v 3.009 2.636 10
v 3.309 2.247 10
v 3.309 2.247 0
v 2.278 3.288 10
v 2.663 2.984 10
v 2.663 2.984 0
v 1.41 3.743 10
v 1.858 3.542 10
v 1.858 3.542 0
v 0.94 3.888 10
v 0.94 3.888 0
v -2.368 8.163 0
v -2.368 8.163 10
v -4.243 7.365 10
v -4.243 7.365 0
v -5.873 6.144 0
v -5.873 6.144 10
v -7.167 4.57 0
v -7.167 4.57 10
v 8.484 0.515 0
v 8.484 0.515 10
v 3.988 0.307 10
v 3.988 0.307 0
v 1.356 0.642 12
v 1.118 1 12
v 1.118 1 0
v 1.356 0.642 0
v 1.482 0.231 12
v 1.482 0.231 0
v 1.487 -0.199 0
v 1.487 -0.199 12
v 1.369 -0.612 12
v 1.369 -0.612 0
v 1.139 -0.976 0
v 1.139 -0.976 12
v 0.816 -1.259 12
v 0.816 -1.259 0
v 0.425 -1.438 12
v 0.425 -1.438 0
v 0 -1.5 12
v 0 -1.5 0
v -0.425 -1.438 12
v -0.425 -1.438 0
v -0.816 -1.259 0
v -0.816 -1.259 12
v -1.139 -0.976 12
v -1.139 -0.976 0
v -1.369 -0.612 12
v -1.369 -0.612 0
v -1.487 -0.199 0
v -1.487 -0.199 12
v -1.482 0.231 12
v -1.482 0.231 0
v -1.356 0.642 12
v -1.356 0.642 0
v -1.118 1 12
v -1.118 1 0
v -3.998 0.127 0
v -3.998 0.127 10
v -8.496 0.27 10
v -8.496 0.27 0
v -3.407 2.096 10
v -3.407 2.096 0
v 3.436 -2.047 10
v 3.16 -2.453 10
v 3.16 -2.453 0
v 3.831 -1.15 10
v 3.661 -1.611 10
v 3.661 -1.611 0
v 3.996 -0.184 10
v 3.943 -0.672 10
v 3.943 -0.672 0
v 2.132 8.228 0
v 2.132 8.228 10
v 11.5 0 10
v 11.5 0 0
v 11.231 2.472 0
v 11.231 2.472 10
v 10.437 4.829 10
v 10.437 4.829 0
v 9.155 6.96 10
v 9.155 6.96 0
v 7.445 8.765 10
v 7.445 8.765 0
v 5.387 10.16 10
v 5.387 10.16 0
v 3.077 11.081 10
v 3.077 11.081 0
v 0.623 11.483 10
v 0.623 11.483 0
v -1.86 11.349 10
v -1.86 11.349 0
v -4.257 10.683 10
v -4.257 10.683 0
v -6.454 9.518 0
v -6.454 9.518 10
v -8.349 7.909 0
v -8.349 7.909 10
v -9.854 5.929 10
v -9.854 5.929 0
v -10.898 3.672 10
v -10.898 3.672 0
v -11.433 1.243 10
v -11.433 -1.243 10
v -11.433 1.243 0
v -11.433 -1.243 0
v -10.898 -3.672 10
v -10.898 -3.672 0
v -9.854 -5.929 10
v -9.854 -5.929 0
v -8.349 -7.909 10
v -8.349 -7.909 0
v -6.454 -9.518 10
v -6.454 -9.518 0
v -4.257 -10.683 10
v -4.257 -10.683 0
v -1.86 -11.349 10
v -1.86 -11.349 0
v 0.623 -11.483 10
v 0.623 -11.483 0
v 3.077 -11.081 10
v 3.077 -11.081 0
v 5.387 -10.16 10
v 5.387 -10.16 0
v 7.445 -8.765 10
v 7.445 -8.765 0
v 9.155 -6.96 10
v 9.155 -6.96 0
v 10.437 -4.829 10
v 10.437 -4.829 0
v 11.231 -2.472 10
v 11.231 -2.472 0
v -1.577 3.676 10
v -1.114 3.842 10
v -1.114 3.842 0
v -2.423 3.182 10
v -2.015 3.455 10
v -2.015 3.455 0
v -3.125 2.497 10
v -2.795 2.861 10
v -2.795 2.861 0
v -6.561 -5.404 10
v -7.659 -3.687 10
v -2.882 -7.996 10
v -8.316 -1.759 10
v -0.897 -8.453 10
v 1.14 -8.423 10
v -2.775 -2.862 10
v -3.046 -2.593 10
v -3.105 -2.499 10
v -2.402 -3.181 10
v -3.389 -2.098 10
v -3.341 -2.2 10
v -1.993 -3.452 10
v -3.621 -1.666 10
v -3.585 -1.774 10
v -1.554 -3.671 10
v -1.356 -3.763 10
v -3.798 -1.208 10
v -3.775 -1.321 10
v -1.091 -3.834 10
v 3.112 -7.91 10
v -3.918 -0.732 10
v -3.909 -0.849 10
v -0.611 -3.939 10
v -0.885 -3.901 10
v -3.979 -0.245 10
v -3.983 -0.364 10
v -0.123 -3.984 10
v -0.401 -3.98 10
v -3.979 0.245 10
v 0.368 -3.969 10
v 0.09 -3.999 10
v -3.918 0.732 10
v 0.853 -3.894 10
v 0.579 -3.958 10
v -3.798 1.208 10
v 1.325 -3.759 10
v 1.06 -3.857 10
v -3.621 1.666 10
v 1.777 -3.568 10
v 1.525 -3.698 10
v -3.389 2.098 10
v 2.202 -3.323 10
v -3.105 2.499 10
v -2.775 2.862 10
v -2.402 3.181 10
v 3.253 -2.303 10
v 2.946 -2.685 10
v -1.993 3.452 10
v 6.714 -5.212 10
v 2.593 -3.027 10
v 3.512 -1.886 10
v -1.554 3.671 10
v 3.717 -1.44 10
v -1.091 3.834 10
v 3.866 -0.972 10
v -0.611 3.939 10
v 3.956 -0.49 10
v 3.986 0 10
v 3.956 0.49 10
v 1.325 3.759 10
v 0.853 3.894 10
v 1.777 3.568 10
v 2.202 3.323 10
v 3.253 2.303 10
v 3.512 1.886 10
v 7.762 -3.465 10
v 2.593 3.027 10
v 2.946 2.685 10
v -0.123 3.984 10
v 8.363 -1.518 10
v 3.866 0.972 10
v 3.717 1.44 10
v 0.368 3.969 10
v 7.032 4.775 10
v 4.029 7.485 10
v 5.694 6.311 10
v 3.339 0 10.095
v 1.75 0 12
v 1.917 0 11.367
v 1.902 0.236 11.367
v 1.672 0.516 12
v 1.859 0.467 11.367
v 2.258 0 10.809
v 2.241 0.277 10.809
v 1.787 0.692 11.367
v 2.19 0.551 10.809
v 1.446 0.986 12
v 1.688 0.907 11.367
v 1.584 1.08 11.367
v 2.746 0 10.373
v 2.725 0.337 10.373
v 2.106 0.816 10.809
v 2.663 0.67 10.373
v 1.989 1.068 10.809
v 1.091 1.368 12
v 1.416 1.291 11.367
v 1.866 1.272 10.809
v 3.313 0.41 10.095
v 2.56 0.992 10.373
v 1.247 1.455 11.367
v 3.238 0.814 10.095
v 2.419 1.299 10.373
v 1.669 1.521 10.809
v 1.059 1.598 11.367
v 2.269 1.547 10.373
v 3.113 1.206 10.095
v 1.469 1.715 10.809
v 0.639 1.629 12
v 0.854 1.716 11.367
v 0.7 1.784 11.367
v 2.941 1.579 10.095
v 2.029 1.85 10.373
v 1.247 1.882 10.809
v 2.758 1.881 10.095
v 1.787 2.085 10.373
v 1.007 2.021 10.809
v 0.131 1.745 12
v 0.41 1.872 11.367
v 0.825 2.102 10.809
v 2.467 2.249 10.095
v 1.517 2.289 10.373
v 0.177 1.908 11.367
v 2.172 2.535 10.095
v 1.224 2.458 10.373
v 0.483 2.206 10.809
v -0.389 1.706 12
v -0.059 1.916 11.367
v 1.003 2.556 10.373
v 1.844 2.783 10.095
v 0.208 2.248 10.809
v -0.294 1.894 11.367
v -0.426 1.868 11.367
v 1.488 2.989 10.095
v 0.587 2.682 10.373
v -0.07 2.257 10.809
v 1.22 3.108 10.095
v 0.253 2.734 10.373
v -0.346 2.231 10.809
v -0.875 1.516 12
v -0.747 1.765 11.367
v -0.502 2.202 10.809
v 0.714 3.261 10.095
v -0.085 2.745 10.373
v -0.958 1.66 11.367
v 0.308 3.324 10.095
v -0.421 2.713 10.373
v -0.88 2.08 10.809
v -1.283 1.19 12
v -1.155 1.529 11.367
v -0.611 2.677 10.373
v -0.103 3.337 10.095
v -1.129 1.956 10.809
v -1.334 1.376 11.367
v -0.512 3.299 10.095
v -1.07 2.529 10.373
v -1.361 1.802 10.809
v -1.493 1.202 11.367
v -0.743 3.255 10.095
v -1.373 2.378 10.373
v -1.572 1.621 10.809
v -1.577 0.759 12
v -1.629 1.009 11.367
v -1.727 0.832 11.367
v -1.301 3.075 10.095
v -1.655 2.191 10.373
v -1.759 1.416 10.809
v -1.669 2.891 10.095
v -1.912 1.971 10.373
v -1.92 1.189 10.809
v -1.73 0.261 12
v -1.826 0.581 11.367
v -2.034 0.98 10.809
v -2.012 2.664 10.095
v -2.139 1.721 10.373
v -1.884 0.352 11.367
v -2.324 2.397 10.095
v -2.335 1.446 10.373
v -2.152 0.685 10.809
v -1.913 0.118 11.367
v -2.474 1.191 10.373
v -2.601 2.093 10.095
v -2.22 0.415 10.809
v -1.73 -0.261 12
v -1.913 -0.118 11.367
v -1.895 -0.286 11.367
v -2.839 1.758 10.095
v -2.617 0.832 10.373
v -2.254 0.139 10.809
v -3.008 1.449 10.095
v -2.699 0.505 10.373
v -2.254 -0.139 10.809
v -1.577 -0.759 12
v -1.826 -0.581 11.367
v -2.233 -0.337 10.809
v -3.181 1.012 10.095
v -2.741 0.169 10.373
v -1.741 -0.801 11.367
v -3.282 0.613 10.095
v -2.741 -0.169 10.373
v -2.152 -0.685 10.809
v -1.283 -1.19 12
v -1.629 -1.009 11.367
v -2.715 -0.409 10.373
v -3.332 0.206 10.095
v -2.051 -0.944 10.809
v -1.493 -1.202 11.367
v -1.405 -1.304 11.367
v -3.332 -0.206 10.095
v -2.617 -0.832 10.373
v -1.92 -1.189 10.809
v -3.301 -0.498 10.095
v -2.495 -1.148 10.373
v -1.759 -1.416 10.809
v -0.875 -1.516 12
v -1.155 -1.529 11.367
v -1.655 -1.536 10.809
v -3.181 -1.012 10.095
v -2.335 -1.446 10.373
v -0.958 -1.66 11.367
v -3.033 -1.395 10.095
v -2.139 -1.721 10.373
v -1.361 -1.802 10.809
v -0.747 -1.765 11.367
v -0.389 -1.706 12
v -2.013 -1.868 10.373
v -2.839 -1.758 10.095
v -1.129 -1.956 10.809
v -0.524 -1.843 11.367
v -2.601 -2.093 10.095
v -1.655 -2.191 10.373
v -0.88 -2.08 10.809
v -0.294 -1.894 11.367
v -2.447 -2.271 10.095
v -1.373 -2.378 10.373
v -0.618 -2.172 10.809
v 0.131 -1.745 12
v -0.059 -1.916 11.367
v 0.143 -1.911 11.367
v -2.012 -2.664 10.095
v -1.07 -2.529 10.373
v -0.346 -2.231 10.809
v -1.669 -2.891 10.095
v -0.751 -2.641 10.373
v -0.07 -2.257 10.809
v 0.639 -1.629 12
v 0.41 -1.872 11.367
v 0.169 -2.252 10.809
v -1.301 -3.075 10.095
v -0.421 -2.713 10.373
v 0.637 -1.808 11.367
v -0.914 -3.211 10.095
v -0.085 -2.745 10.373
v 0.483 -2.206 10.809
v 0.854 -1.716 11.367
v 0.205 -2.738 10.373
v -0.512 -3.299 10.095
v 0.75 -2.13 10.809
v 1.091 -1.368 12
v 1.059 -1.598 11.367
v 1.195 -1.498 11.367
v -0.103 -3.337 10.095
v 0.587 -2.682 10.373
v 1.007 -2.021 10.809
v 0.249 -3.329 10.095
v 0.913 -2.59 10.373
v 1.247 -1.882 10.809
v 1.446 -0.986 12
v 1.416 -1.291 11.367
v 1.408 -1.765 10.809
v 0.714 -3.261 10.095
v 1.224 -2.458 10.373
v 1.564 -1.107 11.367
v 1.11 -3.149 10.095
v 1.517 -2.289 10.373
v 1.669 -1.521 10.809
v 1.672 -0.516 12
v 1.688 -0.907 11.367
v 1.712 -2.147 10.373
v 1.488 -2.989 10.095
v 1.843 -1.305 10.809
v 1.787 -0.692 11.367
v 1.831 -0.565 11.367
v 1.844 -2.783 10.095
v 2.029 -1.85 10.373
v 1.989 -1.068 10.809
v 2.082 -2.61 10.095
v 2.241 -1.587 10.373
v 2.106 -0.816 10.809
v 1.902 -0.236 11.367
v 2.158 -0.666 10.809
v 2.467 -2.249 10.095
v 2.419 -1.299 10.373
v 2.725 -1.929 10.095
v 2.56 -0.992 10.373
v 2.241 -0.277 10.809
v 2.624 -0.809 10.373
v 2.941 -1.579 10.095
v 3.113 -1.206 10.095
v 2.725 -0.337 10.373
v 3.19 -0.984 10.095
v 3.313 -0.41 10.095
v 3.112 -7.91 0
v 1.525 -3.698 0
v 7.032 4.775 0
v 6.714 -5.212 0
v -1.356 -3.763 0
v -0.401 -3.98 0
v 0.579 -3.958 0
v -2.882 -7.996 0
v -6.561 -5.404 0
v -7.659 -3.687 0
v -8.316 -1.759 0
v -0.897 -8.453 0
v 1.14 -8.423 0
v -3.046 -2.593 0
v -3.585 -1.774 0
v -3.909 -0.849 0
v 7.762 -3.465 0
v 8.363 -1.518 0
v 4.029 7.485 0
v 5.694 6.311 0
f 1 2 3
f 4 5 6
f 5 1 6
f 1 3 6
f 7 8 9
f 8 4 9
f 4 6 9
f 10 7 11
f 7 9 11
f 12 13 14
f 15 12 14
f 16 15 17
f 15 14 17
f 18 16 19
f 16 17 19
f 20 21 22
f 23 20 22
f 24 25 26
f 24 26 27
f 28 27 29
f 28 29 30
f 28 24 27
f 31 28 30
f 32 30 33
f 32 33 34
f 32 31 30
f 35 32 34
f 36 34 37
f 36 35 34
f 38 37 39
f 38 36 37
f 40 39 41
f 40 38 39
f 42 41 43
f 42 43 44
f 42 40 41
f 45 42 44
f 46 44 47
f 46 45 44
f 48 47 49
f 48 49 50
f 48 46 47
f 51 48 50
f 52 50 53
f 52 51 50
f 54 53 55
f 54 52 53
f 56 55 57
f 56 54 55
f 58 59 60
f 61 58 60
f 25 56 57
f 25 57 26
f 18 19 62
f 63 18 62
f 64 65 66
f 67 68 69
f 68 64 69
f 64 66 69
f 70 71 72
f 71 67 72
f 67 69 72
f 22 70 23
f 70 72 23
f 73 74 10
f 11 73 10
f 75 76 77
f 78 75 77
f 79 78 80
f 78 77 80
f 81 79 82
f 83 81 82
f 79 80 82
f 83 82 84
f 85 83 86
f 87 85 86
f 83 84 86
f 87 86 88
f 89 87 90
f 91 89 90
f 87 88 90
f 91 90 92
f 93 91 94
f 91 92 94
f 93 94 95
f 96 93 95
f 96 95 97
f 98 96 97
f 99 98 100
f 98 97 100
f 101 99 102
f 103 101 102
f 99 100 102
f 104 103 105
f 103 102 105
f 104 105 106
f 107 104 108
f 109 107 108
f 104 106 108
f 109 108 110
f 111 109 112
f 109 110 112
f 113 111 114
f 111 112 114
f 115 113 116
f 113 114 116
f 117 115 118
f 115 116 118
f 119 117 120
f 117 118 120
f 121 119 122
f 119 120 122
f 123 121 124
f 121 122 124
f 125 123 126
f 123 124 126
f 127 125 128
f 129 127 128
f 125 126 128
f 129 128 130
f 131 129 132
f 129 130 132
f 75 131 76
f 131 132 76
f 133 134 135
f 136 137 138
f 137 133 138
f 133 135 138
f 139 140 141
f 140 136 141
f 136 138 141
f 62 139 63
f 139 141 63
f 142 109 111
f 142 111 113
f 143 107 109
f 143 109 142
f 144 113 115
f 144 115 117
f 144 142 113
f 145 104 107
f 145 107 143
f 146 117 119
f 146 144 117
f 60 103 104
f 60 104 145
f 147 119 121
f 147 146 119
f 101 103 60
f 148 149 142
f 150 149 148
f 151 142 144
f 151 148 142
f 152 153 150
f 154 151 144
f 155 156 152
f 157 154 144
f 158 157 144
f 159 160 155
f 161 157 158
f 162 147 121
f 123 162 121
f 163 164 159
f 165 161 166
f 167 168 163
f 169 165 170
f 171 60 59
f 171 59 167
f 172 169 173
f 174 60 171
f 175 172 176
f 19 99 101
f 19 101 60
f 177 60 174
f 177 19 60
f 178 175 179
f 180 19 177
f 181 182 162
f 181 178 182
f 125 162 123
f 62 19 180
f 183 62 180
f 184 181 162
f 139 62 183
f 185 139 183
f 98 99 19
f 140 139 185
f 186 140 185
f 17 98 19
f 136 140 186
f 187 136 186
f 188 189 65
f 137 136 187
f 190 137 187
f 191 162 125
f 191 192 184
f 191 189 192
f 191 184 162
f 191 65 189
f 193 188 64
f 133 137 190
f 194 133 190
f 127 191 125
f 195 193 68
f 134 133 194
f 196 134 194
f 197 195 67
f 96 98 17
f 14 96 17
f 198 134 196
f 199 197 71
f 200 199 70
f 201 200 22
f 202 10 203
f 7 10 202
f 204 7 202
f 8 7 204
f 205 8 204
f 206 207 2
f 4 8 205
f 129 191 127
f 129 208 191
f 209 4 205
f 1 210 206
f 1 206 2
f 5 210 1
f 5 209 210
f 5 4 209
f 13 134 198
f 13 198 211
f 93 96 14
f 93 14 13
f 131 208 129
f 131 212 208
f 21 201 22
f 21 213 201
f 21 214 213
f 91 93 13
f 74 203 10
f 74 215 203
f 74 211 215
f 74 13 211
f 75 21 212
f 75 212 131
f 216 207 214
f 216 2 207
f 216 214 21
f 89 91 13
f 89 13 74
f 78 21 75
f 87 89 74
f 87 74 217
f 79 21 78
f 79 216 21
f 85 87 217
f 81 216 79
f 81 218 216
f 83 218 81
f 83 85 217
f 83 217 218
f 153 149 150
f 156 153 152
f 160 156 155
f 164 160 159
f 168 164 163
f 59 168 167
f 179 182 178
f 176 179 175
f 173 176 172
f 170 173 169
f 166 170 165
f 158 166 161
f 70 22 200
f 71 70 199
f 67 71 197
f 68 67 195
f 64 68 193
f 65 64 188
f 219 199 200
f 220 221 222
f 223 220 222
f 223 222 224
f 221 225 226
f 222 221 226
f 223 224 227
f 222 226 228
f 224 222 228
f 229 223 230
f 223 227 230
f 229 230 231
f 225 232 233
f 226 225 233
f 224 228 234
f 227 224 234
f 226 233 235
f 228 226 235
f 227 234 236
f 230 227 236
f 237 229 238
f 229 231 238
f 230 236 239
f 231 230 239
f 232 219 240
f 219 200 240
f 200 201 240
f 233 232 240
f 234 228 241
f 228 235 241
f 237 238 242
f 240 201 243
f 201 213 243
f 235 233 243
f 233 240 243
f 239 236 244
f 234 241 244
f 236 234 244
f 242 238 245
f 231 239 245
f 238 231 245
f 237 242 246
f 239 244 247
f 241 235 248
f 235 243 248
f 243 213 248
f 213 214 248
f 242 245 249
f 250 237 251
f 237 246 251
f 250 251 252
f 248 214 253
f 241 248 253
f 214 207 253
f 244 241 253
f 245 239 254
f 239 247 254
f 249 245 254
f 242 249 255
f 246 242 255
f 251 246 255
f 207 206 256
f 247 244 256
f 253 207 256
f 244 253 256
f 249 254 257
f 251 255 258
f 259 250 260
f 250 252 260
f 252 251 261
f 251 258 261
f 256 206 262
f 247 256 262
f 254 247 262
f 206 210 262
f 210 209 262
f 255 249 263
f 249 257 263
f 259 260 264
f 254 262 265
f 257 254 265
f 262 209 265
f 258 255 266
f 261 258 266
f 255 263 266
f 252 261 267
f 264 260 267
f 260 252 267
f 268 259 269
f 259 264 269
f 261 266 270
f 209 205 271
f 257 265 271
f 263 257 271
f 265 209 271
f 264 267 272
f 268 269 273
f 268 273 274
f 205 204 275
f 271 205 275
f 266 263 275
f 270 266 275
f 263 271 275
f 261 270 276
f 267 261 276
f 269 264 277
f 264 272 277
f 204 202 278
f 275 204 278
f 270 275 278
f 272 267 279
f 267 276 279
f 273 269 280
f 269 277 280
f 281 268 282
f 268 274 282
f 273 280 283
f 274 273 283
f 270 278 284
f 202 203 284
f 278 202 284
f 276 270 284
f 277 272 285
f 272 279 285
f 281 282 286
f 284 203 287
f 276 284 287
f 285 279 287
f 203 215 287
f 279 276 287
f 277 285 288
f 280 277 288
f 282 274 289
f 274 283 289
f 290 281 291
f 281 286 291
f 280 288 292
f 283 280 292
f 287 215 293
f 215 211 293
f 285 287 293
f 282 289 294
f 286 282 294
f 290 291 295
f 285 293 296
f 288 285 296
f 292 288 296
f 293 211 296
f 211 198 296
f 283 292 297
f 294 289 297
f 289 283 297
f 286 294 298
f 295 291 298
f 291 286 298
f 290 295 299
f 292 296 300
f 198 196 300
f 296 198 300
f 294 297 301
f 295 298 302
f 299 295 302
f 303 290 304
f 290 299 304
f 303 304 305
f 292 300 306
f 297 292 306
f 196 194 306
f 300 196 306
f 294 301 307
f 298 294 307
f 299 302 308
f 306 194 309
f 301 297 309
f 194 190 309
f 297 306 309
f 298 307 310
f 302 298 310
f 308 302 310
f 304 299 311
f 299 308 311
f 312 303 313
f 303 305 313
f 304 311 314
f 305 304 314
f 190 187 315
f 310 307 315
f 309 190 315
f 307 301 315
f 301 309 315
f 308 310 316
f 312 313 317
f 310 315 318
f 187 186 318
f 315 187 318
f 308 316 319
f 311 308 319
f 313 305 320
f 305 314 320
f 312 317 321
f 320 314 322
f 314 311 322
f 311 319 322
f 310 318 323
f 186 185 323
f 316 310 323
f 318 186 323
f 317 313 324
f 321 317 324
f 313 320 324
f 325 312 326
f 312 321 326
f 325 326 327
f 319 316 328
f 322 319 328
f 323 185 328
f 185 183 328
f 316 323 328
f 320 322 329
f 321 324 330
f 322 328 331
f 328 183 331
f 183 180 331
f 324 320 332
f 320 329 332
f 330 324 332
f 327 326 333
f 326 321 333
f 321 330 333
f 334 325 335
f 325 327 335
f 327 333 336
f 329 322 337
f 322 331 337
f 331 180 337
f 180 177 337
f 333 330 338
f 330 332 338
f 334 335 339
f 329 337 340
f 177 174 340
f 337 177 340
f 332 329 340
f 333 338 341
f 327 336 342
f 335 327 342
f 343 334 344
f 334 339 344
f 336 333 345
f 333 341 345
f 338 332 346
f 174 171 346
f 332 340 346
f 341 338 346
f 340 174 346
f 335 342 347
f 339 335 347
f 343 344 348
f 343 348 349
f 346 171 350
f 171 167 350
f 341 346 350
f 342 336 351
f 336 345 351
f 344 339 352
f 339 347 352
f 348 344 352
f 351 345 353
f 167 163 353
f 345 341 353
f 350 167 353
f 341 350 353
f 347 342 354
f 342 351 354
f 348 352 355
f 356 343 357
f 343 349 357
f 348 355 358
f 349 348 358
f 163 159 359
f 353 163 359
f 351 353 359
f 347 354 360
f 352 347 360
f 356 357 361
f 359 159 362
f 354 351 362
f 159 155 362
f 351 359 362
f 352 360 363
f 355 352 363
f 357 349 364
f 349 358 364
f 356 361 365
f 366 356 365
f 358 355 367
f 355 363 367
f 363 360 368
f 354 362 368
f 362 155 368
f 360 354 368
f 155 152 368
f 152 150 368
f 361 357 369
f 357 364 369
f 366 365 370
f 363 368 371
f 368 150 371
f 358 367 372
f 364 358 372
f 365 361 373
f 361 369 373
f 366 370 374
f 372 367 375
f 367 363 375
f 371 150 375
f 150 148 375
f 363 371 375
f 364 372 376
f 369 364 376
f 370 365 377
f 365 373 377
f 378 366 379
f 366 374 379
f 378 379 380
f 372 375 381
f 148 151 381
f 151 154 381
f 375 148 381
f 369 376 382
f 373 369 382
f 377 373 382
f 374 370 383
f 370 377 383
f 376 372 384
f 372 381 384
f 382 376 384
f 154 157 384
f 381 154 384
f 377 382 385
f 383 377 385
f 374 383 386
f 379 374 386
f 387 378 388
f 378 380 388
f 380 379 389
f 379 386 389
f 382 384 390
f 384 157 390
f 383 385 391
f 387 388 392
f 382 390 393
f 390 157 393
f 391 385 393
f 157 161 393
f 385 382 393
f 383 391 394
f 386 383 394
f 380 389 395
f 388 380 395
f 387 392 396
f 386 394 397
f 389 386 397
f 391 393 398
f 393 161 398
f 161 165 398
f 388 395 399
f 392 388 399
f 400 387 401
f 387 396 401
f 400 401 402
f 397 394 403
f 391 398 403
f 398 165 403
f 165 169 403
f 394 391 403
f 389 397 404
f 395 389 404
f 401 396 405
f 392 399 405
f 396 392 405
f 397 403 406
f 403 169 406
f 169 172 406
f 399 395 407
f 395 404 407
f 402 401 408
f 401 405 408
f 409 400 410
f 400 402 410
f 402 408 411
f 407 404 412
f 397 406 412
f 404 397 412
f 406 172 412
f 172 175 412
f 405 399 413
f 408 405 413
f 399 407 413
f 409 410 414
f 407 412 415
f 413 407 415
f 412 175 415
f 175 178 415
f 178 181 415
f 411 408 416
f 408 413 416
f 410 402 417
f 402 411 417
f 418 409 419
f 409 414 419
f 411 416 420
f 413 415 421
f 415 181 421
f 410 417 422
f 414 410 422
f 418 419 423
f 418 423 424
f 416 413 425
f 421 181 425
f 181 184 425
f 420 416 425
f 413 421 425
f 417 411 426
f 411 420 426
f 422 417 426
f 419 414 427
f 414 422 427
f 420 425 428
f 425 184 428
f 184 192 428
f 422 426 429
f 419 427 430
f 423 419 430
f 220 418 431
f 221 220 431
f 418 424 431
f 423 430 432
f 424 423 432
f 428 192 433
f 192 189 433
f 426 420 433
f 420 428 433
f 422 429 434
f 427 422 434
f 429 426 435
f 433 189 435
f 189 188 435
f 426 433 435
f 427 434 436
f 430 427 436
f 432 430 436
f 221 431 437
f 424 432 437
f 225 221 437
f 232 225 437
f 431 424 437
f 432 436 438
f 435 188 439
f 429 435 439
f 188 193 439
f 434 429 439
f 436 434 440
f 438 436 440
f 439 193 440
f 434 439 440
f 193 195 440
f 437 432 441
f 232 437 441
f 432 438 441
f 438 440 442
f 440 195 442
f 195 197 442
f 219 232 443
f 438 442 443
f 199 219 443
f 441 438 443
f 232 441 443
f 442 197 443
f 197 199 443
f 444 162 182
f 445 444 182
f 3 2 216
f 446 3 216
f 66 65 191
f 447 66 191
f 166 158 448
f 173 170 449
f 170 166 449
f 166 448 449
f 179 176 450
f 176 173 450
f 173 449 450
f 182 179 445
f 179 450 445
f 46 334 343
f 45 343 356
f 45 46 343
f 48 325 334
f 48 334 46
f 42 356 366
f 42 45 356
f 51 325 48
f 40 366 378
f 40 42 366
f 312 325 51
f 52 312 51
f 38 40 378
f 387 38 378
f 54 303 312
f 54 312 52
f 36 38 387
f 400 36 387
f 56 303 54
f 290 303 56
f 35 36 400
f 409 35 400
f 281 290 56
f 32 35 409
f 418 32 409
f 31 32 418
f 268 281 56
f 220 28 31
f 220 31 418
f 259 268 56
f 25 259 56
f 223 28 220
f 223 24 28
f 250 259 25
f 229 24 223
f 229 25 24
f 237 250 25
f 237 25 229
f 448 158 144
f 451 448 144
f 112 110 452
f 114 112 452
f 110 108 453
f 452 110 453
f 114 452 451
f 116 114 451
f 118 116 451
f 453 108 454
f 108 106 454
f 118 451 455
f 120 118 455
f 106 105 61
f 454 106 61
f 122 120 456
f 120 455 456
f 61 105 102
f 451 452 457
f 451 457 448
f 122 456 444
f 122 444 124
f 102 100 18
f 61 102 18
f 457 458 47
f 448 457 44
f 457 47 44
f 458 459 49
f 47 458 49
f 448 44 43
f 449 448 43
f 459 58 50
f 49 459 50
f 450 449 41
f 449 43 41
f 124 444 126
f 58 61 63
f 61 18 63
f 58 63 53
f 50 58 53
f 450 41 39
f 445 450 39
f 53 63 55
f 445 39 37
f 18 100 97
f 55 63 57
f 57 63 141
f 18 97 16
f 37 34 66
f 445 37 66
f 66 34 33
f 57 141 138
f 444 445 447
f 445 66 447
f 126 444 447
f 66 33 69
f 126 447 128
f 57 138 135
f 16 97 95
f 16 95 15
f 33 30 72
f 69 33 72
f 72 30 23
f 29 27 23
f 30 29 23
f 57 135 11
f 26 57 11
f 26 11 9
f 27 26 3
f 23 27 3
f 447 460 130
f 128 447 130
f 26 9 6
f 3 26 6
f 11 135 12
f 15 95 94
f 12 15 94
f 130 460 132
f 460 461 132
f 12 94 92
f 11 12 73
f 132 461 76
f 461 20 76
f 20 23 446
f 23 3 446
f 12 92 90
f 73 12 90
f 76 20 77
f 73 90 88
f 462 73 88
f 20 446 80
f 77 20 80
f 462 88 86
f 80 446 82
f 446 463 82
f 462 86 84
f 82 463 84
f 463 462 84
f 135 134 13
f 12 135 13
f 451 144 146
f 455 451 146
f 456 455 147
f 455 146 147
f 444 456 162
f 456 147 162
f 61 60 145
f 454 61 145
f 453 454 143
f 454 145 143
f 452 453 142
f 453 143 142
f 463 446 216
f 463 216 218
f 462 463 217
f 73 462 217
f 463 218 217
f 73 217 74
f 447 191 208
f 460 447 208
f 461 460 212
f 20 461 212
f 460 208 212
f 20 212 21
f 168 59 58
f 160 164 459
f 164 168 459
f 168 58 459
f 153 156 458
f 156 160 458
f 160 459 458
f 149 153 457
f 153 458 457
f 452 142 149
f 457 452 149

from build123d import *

# Parameters (mm, degrees)
SKETCH1_R           = 11.5
BOSS_EXTRUDE1_DEPTH = 10
SKETCH2_R           = 8.5
CUT_EXTRUDE2_DEPTH  = 10
SKETCH4_R           = 4
BOSS_EXTRUDE2_DEPTH = 10
BOSS_EXTRUDE3_START = 10
BOSS_EXTRUDE3_DEPTH = 10
CIRPATTERN1_COUNT   = 5
CUT_EXTRUDE4_DEPTH  = 10
SKETCH8_R           = 1.75
BOSS_EXTRUDE4_DEPTH = 2
CUT_EXTRUDE5_DEPTH  = 2
FILLET1_R           = 2.25


with BuildPart() as part:
    # Sketch1 → Boss-Extrude1 (new body)
    with BuildSketch(Plane.XY):
        Circle(SKETCH1_R)
    extrude(amount=BOSS_EXTRUDE1_DEPTH)

    # Sketch2 → Cut-Extrude2 (cut)
    with BuildSketch(Plane.XY.offset(10)):
        Circle(SKETCH2_R)
    extrude(amount=-CUT_EXTRUDE2_DEPTH, mode=Mode.SUBTRACT)



with BuildPart() as body_2:
    # Sketch4 → Boss-Extrude2 (new body)
    with BuildSketch(Plane.XY):
        Circle(SKETCH4_R)
    extrude(amount=BOSS_EXTRUDE2_DEPTH)


with BuildPart() as part_1:
    add(part.part)

    add(body_2.part)  # Boss-Extrude3 merges body 2
    # Sketch6 → Boss-Extrude3 (add)
    with BuildSketch(Plane.XY.offset(BOSS_EXTRUDE3_START)):
        with BuildLine():
            Line((-1.114437127, 3.841618134), (-2.368178894, 8.163438536))
            ThreePointArc((-2.368178894, 8.163438536), (-0.122551325, 8.499116494), (2.131821106, 8.228325393))
            Line((2.131821106, 8.228325393), (0.940332104, 3.887901173))
            ThreePointArc((0.940332104, 3.887901173), (-0.090075911, 3.998985663), (-1.114437127, 3.841618134))
        make_face()
    boss_extrude3 = extrude(amount=-BOSS_EXTRUDE3_DEPTH)

    # CirPattern1: Boss-Extrude3 ×5 about axis
    cirpattern1_axis = Axis((0, 0, 0), (0, 0, 1))
    for i in range(1, CIRPATTERN1_COUNT):
        add(boss_extrude3.rotate(cirpattern1_axis, i * 360 / CIRPATTERN1_COUNT))

    # Sketch7 → Cut-Extrude4 (cut)
    with BuildSketch(Plane.XY.offset(10)):
        with BuildLine():
            Line((-1.118033989, 1), (1.118033989, 1))
            ThreePointArc((1.118033989, 1), (0, -1.5), (-1.118033989, 1))
        make_face()
    extrude(amount=-CUT_EXTRUDE4_DEPTH, mode=Mode.SUBTRACT)

    # Sketch8 → Boss-Extrude4 (add)
    with BuildSketch(Plane.XY.offset(10)):
        Circle(SKETCH8_R)
    extrude(amount=BOSS_EXTRUDE4_DEPTH)

    # Sketch9 → Cut-Extrude5 (cut)
    with BuildSketch(Plane.XY.offset(12)):
        with BuildLine():
            Line((-1.118033989, 1), (1.118033989, 1))
            ThreePointArc((1.118033989, 1), (0, -1.5), (-1.118033989, 1))
        make_face()
    extrude(amount=-CUT_EXTRUDE5_DEPTH, mode=Mode.SUBTRACT)

    # Fillet1
    # the kernel refuses this fillet: 2.25 mm, written as the material it adds along each edge
    with BuildSketch(Plane(origin=(0, 0, 10), x_dir=(1, 0, 0), z_dir=(0, -1, 0))) as fillet1_piece_1:
        with BuildLine():
            CenterArc((3.986067977, 2.25), FILLET1_R, 186.379370208, 83.620629792)
            Line((1.75, 2), (1.70527864, 1.995))
            ThreePointArc((1.70527864, 1.995), (1.705, 1), (1.705, 0))
            Line((1.705, 0), (1.75, -0.045))
            Line((1.75, -0.045), (3.986067977, -0.045))
            Line((3.986067977, -0.045), (3.986067977, 0))
        make_face()
    revolve(axis=Axis((0, 0, 10), (0, 0, 1)))


solid = part_1.part
